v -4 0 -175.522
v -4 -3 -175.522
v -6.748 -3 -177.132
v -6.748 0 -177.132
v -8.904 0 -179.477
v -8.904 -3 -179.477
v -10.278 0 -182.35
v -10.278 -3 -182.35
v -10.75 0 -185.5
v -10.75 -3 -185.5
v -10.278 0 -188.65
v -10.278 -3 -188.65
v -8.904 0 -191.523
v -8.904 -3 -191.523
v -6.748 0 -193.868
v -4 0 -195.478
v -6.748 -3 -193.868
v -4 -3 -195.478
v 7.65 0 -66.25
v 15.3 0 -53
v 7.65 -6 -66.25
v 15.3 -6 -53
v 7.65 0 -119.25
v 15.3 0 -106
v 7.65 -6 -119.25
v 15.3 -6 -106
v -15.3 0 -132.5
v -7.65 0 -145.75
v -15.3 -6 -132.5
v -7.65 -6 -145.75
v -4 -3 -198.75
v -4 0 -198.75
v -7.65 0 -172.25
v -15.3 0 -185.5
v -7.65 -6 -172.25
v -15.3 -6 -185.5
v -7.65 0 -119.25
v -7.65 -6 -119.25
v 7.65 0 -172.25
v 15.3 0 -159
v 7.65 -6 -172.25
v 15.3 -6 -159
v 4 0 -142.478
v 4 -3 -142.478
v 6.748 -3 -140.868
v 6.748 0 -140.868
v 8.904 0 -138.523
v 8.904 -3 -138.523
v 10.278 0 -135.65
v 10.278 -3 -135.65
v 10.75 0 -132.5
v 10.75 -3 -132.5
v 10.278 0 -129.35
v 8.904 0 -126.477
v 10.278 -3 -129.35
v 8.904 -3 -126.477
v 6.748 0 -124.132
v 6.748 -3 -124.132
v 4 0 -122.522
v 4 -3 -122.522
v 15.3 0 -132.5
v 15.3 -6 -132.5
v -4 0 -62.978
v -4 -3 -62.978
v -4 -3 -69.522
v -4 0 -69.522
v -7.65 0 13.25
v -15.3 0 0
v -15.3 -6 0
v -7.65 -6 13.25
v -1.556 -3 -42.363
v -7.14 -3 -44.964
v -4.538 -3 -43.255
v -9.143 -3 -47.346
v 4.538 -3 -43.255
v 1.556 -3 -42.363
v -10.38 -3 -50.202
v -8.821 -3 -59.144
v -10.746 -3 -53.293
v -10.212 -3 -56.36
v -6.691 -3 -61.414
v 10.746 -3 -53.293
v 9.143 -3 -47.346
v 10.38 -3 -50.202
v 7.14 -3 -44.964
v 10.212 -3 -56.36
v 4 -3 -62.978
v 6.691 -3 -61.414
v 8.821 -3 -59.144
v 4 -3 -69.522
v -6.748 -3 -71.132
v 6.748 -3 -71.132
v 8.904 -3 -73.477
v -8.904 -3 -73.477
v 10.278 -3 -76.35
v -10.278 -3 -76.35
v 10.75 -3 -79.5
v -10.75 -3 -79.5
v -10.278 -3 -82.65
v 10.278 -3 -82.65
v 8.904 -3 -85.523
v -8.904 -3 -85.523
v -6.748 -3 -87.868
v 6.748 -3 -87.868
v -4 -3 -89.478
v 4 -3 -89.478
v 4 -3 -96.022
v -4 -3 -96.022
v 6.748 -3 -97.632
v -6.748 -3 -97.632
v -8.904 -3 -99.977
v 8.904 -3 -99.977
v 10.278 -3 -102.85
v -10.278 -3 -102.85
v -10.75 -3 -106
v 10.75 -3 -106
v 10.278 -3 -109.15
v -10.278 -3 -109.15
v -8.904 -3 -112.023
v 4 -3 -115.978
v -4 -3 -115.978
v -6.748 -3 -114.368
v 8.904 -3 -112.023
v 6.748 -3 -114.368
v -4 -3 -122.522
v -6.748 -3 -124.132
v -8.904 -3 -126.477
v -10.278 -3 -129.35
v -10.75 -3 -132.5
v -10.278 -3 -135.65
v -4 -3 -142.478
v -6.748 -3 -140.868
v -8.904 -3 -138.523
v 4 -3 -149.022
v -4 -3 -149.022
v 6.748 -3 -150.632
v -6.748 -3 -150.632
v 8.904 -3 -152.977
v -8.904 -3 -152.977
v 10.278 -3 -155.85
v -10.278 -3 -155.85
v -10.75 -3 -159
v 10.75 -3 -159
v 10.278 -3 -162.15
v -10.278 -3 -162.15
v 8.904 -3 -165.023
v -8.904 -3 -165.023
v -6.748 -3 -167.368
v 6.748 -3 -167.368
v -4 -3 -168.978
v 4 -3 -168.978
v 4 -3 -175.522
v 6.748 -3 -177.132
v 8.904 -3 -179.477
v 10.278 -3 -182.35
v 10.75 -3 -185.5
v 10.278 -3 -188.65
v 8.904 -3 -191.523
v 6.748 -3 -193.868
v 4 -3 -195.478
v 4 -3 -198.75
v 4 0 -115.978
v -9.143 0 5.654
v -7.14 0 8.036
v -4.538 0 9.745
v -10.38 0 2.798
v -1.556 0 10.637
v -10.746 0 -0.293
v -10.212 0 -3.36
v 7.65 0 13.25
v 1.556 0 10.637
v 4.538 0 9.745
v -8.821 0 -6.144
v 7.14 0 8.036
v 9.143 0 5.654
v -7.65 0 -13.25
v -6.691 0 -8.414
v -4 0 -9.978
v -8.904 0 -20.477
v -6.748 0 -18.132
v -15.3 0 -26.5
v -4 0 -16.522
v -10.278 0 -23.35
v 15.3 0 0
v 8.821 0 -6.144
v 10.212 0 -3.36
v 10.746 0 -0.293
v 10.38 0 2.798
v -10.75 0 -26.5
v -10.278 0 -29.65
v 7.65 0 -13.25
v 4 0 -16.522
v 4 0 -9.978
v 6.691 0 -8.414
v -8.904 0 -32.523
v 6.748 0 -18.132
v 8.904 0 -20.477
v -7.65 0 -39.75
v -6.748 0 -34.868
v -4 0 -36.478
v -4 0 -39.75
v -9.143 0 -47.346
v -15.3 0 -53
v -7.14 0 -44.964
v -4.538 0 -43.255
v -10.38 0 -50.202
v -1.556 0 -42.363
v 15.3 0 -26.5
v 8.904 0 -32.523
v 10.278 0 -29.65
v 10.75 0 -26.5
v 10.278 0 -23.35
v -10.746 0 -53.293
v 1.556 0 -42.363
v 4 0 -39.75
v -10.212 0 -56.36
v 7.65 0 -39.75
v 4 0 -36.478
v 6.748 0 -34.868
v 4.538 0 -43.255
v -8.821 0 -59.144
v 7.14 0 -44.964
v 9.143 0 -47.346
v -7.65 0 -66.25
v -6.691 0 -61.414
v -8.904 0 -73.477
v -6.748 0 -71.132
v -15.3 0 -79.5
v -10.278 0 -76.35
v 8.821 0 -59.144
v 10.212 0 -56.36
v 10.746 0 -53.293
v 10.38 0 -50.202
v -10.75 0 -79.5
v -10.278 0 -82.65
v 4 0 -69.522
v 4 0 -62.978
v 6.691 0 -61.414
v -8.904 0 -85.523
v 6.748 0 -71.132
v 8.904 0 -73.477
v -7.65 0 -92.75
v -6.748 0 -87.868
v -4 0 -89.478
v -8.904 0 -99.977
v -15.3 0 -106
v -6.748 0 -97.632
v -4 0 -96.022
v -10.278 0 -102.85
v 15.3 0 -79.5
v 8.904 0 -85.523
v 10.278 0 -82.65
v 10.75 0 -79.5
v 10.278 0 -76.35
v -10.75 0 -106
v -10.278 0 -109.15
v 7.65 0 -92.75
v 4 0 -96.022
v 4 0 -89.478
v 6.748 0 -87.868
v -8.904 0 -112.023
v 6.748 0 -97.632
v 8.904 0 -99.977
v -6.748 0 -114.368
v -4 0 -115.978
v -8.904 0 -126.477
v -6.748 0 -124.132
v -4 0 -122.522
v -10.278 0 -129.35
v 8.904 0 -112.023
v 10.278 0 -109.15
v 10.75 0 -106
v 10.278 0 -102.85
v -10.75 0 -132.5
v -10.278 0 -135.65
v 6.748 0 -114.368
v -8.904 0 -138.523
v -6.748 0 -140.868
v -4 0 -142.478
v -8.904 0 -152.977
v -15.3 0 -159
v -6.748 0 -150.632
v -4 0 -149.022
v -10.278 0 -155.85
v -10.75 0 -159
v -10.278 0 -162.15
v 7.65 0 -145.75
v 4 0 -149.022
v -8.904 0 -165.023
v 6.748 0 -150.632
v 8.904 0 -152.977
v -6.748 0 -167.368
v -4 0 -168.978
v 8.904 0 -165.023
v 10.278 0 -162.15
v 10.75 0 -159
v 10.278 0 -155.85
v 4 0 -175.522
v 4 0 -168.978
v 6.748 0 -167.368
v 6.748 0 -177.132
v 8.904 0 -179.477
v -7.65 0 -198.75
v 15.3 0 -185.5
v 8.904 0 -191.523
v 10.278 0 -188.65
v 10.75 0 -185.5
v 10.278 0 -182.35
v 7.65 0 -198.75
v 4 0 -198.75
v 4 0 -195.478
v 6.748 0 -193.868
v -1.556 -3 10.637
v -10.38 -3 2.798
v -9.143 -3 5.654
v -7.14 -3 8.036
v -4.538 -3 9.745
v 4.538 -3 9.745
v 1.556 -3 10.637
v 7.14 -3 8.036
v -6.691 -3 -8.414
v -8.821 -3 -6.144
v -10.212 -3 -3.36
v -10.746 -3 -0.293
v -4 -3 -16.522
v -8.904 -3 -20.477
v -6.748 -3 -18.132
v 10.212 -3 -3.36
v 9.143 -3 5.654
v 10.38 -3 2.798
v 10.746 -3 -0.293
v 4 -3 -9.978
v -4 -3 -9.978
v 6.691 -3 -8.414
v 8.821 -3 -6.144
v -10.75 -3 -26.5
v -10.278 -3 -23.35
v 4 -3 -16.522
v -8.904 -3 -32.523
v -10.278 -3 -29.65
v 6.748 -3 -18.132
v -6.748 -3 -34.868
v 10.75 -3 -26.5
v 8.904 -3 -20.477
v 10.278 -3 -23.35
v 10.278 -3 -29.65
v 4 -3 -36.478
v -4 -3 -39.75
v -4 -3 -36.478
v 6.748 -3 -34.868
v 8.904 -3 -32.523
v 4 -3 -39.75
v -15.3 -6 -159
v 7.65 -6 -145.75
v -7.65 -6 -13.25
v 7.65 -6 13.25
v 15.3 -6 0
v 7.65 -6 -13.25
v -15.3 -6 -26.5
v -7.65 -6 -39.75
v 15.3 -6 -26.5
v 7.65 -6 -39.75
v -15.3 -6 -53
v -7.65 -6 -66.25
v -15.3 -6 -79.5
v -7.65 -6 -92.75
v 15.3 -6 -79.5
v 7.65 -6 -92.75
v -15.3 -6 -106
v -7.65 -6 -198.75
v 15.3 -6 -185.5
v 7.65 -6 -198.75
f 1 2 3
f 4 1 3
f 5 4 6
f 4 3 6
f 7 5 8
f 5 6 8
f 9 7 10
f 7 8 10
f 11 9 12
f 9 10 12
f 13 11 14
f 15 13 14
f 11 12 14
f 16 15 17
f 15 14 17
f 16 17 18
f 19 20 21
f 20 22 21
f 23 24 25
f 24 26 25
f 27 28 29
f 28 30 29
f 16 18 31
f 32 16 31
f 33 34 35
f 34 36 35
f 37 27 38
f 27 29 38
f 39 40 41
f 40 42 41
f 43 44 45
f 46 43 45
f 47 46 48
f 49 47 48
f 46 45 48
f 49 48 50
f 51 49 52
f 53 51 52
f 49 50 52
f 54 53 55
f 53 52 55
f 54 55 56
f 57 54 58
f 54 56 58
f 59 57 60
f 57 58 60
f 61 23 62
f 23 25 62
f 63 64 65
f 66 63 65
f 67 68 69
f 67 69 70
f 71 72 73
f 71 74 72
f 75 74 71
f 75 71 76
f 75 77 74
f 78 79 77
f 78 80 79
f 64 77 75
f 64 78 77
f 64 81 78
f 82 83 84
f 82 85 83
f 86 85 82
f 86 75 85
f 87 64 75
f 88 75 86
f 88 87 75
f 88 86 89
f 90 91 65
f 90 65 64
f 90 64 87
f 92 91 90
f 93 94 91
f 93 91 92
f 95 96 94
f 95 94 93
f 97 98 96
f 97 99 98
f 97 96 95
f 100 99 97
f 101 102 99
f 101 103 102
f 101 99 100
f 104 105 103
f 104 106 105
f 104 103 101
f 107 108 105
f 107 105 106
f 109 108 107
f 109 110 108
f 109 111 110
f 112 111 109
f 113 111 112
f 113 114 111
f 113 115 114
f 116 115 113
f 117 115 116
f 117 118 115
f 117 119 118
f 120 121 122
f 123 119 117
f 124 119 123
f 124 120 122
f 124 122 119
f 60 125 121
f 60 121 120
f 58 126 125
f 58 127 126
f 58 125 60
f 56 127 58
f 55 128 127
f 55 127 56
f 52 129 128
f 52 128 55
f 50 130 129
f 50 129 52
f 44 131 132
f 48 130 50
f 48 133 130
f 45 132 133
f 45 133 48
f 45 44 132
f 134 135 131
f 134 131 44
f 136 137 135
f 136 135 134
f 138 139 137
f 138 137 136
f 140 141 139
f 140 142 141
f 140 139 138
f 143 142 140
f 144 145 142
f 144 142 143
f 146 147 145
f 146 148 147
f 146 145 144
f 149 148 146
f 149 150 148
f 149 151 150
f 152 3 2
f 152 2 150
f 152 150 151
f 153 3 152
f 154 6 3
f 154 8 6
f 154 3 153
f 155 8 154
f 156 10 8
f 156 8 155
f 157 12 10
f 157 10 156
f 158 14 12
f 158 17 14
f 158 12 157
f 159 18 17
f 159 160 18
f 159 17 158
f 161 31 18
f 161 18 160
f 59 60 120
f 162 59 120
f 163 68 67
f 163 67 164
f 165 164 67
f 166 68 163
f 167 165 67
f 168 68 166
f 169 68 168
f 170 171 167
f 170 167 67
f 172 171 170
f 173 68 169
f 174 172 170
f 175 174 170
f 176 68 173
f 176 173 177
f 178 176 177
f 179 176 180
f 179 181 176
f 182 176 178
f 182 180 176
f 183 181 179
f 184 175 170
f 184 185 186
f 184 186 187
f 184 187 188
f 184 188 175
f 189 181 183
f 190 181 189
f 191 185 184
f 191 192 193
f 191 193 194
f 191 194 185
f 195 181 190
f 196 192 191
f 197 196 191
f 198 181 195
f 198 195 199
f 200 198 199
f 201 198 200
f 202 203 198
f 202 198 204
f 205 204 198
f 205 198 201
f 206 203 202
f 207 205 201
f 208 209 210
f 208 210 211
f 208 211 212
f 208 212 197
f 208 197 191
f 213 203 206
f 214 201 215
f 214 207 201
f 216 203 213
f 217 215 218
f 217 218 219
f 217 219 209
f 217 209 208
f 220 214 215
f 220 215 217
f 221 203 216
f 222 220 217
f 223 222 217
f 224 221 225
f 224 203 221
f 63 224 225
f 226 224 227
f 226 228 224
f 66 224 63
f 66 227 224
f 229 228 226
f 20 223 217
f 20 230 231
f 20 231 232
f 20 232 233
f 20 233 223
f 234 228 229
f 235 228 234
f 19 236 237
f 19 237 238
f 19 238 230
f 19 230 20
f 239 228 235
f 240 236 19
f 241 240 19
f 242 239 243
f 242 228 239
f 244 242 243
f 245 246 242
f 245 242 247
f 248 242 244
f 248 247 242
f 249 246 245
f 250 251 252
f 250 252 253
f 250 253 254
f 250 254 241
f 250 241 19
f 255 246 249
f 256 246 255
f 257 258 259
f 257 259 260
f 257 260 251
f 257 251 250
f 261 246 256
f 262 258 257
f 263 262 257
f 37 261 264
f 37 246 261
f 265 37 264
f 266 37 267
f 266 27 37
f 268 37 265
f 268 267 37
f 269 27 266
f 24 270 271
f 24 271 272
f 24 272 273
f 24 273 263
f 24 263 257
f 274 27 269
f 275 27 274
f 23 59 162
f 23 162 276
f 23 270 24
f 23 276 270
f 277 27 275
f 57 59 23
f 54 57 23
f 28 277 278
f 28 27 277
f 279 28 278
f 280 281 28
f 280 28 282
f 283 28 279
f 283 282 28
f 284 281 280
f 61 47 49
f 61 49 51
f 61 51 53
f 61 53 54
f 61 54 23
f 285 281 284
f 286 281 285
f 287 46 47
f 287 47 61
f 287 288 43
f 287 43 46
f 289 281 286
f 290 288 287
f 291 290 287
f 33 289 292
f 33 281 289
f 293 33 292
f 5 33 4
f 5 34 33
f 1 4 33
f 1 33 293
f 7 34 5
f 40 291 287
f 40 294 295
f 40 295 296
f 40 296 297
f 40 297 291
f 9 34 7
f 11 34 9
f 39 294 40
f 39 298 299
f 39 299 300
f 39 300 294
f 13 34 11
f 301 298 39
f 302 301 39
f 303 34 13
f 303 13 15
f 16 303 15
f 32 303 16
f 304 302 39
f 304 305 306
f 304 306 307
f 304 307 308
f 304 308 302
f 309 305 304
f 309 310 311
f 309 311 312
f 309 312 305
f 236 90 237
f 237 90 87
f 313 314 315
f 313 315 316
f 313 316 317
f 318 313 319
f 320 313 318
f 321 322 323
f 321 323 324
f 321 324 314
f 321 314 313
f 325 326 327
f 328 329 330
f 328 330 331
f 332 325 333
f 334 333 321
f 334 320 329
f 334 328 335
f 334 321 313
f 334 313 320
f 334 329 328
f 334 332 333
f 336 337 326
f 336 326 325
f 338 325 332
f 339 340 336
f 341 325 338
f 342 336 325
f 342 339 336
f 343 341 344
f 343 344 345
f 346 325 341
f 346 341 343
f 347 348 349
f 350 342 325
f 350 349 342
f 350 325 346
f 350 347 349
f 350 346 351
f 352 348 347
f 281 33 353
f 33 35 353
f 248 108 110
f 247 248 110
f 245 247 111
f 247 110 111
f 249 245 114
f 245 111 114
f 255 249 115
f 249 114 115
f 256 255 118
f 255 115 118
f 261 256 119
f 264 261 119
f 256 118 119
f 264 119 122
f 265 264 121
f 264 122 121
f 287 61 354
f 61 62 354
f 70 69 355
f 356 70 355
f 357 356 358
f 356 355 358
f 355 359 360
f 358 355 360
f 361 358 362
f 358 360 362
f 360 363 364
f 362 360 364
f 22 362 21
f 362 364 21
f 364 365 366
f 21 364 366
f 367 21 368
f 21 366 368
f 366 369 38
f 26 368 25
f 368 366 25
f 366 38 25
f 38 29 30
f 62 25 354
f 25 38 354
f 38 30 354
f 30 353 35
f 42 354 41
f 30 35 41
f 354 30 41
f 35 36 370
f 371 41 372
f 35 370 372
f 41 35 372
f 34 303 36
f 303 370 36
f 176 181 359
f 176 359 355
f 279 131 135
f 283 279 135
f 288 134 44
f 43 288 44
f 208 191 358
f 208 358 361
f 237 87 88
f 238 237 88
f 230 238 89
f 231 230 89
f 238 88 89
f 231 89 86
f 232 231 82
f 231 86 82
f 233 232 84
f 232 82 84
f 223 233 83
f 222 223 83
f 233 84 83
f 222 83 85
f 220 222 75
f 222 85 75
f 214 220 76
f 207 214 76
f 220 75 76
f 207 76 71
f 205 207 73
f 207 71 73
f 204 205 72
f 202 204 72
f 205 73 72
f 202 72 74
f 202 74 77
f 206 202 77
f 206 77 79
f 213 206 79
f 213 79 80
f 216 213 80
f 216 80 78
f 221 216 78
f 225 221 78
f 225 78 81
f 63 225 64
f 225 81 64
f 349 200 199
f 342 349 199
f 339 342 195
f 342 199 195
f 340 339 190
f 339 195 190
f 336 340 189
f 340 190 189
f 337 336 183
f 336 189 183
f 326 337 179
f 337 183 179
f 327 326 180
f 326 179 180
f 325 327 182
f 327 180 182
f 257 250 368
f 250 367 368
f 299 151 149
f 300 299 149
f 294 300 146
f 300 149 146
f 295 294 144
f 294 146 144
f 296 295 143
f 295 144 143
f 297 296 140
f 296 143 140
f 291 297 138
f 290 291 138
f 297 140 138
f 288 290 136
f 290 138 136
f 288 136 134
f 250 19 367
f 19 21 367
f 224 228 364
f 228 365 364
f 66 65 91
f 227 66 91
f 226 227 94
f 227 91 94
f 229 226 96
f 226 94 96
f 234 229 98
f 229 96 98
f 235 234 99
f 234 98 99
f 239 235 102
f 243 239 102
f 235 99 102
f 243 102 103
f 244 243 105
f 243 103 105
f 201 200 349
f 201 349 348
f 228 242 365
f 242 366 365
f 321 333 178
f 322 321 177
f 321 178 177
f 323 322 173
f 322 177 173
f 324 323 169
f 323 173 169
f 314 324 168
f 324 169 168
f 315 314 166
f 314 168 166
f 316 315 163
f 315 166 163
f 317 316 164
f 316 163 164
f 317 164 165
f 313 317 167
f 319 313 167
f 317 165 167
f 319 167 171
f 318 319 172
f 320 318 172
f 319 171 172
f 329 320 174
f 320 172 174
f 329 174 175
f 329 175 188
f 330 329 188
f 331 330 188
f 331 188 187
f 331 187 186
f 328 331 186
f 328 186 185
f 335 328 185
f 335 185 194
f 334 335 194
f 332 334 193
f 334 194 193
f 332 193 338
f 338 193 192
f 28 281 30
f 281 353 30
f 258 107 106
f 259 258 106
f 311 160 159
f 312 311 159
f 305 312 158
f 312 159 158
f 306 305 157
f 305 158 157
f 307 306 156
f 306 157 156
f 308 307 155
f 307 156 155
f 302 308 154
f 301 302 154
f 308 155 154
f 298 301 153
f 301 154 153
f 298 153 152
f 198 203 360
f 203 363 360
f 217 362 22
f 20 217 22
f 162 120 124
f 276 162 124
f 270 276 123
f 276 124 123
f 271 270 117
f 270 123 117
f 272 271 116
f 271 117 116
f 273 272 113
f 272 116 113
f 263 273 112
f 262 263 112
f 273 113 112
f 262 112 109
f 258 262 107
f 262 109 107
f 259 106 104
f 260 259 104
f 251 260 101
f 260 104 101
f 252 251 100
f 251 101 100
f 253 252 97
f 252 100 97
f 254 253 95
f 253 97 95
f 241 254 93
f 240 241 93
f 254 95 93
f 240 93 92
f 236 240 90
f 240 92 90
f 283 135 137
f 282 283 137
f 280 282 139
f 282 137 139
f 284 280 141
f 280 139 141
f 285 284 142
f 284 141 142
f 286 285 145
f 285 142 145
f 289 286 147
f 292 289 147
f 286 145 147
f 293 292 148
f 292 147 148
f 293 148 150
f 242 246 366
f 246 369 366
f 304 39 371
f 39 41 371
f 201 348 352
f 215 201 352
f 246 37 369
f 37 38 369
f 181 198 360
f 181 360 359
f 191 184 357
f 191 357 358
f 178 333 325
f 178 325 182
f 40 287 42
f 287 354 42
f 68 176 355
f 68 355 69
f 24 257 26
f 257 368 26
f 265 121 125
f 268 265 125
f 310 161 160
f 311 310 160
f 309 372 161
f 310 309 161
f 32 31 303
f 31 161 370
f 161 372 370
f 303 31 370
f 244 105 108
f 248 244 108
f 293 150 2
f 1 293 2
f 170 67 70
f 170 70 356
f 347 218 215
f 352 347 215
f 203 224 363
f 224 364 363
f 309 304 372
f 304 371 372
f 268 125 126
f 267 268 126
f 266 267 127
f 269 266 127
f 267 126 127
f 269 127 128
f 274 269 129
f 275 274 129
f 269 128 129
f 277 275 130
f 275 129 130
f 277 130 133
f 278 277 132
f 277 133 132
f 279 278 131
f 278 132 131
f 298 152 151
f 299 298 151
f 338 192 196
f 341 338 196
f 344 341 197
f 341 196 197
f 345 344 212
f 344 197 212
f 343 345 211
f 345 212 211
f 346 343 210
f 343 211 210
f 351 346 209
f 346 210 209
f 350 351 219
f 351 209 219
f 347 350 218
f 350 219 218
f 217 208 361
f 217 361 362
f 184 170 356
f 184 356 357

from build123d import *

# Parameters (mm, degrees)
BOSS_EXTRUDE1_DEPTH = 6
SKETCH2_R           = 10.75
CUT_EXTRUDE1_DEPTH  = 3
SKETCH4_W           = 8
SKETCH4_H           = 3.271898978
CUT_EXTRUDE2_DEPTH  = 3
LPATTERN1_COUNT     = 2
LPATTERN1_PITCH     = 26.5
SKETCH6_W           = 8
SKETCH6_H           = 3
CUT_EXTRUDE3_DEPTH  = 32.182259914
LPATTERN2_START     = -6
LPATTERN2_DEPTH     = 3
LPATTERN2_START_2   = -3
LPATTERN2_2_DEPTH   = 3


# Read off the part's stored shape, not the designer's step: LPattern2
with BuildPart() as part:
    # Sketch3 → Boss-Extrude1 (new body)
    with BuildSketch(Plane(origin=(0, 0, 0), x_dir=(1, 0, 0), z_dir=(0, 1, 0))):
        Polygon((15.299782134, 0), (7.649891067, 13.25), (-7.649891067, 13.25), (-15.299782134, 0), (-7.649891067, -13.25), (7.649891067, -13.25), align=None)
    boss_extrude1 = extrude(amount=-BOSS_EXTRUDE1_DEPTH)

    # Sketch2 → Cut-Extrude1 (cut)
    with BuildSketch(Plane(origin=(0, 0, 0), x_dir=(1, 0, 0), z_dir=(0, 1, 0))):
        with Locations(Location((0, 0, 0), (0, 0, 270))):
            Circle(SKETCH2_R)
    cut_extrude1 = extrude(amount=-CUT_EXTRUDE1_DEPTH, mode=Mode.SUBTRACT)

    # Sketch4 → Cut-Extrude2 (cut)
    with BuildSketch(Plane(origin=(0, 0, 0), x_dir=(1, 0, 0), z_dir=(0, 1, 0))):
        with Locations((0, 11.614050511)):
            Rectangle(SKETCH4_W, SKETCH4_H)
    cut_extrude2 = extrude(amount=-CUT_EXTRUDE2_DEPTH, mode=Mode.SUBTRACT)

    # LPattern1: Boss-Extrude1, Cut-Extrude1, Cut-Extrude2 ×2
    with Locations(*[(0, 0, -i * LPATTERN1_PITCH) for i in range(1, LPATTERN1_COUNT)]):
        add(boss_extrude1)
        add(cut_extrude1, mode=Mode.SUBTRACT)
        add(cut_extrude2, mode=Mode.SUBTRACT)

    # Sketch6 → Cut-Extrude3 (cut, through all)
    with BuildSketch(Plane.XY.offset(-13.25)):
        with Locations((0, -1.5)):
            Rectangle(SKETCH6_W, SKETCH6_H)
    extrude(amount=-CUT_EXTRUDE3_DEPTH, mode=Mode.SUBTRACT)

    # LPattern2 outline → LPattern2 (add)
    with BuildSketch(Plane(origin=(0, 0, 0), x_dir=(1, 0, 0), z_dir=(0, 1, 0)).offset(LPATTERN2_START)):
        Polygon((-7.649891067, 198.75), (-15.299782134, 185.5), (-7.649891067, 172.25), (-15.299782134, 159), (-7.649891067, 145.75), (-15.299782134, 132.5), (-7.649891067, 119.25), (-15.299782134, 106), (-7.649891067, 92.75), (-15.299782134, 79.5), (-7.649891067, 66.25), (-15.299782134, 53), (-7.649891067, 39.75), (7.649891067, 39.75), (15.299782134, 53), (7.649891067, 66.25), (15.299782134, 79.5), (7.649891067, 92.75), (15.299782134, 106), (7.649891067, 119.25), (15.299782134, 132.5), (7.649891067, 145.75), (15.299782134, 159), (7.649891067, 172.25), (15.299782134, 185.5), (7.649891067, 198.75), align=None)
    extrude(amount=LPATTERN2_DEPTH)

    # LPattern2 2 outline → LPattern2 2 (add)
    with BuildSketch(Plane(origin=(0, 0, 0), x_dir=(1, 0, 0), z_dir=(0, 1, 0)).offset(LPATTERN2_START_2)):
        with BuildLine():
            ThreePointArc((-4, 69.521898978), (-10.75, 79.5), (-4, 89.478101022))
            Line((-4, 89.478101022), (-4, 96.021898978))
            ThreePointArc((-4, 96.021898978), (-10.75, 106), (-4, 115.978101022))
            Line((-4, 115.978101022), (-4, 122.521898978))
            ThreePointArc((-4, 122.521898978), (-10.75, 132.5), (-4, 142.478101022))
            Line((-4, 142.478101022), (-4, 149.021898978))
            ThreePointArc((-4, 149.021898978), (-10.75, 159), (-4, 168.978101022))
            Line((-4, 168.978101022), (-4, 175.521898978))
            ThreePointArc((-4, 175.521898978), (-10.75, 185.5), (-4, 195.478101022))
            Line((-4, 195.478101022), (-4, 198.75))
            Line((-4, 198.75), (-7.649891067, 198.75))
            Line((-7.649891067, 198.75), (-15.299782134, 185.5))
            Line((-15.299782134, 185.5), (-7.649891067, 172.25))
            Line((-7.649891067, 172.25), (-15.299782134, 159))
            Line((-15.299782134, 159), (-7.649891067, 145.75))
            Line((-7.649891067, 145.75), (-15.299782134, 132.5))
            Line((-15.299782134, 132.5), (-7.649891067, 119.25))
            Line((-7.649891067, 119.25), (-15.299782134, 106))
            Line((-15.299782134, 106), (-7.649891067, 92.75))
            Line((-7.649891067, 92.75), (-15.299782134, 79.5))
            Line((-15.299782134, 79.5), (-7.649891067, 66.25))
            Line((-7.649891067, 66.25), (-15.299782134, 53))
            Line((-15.299782134, 53), (-7.649891067, 39.75))
            Line((-7.649891067, 39.75), (7.649891067, 39.75))
            Line((7.649891067, 39.75), (15.299782134, 53))
            Line((15.299782134, 53), (7.649891067, 66.25))
            Line((7.649891067, 66.25), (15.299782134, 79.5))
            Line((15.299782134, 79.5), (7.649891067, 92.75))
            Line((7.649891067, 92.75), (15.299782134, 106))
            Line((15.299782134, 106), (7.649891067, 119.25))
            Line((7.649891067, 119.25), (15.299782134, 132.5))
            Line((15.299782134, 132.5), (7.649891067, 145.75))
            Line((7.649891067, 145.75), (15.299782134, 159))
            Line((15.299782134, 159), (7.649891067, 172.25))
            Line((7.649891067, 172.25), (15.299782134, 185.5))
            Line((15.299782134, 185.5), (7.649891067, 198.75))
            Line((7.649891067, 198.75), (4, 198.75))
            Line((4, 198.75), (4, 195.478101022))
            ThreePointArc((4, 195.478101022), (10.75, 185.5), (4, 175.521898978))
            Line((4, 175.521898978), (4, 168.978101022))
            ThreePointArc((4, 168.978101022), (10.75, 159), (4, 149.021898978))
            Line((4, 149.021898978), (4, 142.478101022))
            ThreePointArc((4, 142.478101022), (10.75, 132.5), (4, 122.521898978))
            Line((4, 122.521898978), (4, 115.978101022))
            ThreePointArc((4, 115.978101022), (10.75, 106), (4, 96.021898978))
            Line((4, 96.021898978), (4, 89.478101022))
            ThreePointArc((4, 89.478101022), (10.75, 79.5), (4, 69.521898978))
            Line((4, 69.521898978), (4, 62.978101022))
            ThreePointArc((4, 62.978101022), (0, 42.25), (-4, 62.978101022))
            Line((-4, 62.978101022), (-4, 69.521898978))
        make_face()
    extrude(amount=LPATTERN2_2_DEPTH)


solid = part.part
